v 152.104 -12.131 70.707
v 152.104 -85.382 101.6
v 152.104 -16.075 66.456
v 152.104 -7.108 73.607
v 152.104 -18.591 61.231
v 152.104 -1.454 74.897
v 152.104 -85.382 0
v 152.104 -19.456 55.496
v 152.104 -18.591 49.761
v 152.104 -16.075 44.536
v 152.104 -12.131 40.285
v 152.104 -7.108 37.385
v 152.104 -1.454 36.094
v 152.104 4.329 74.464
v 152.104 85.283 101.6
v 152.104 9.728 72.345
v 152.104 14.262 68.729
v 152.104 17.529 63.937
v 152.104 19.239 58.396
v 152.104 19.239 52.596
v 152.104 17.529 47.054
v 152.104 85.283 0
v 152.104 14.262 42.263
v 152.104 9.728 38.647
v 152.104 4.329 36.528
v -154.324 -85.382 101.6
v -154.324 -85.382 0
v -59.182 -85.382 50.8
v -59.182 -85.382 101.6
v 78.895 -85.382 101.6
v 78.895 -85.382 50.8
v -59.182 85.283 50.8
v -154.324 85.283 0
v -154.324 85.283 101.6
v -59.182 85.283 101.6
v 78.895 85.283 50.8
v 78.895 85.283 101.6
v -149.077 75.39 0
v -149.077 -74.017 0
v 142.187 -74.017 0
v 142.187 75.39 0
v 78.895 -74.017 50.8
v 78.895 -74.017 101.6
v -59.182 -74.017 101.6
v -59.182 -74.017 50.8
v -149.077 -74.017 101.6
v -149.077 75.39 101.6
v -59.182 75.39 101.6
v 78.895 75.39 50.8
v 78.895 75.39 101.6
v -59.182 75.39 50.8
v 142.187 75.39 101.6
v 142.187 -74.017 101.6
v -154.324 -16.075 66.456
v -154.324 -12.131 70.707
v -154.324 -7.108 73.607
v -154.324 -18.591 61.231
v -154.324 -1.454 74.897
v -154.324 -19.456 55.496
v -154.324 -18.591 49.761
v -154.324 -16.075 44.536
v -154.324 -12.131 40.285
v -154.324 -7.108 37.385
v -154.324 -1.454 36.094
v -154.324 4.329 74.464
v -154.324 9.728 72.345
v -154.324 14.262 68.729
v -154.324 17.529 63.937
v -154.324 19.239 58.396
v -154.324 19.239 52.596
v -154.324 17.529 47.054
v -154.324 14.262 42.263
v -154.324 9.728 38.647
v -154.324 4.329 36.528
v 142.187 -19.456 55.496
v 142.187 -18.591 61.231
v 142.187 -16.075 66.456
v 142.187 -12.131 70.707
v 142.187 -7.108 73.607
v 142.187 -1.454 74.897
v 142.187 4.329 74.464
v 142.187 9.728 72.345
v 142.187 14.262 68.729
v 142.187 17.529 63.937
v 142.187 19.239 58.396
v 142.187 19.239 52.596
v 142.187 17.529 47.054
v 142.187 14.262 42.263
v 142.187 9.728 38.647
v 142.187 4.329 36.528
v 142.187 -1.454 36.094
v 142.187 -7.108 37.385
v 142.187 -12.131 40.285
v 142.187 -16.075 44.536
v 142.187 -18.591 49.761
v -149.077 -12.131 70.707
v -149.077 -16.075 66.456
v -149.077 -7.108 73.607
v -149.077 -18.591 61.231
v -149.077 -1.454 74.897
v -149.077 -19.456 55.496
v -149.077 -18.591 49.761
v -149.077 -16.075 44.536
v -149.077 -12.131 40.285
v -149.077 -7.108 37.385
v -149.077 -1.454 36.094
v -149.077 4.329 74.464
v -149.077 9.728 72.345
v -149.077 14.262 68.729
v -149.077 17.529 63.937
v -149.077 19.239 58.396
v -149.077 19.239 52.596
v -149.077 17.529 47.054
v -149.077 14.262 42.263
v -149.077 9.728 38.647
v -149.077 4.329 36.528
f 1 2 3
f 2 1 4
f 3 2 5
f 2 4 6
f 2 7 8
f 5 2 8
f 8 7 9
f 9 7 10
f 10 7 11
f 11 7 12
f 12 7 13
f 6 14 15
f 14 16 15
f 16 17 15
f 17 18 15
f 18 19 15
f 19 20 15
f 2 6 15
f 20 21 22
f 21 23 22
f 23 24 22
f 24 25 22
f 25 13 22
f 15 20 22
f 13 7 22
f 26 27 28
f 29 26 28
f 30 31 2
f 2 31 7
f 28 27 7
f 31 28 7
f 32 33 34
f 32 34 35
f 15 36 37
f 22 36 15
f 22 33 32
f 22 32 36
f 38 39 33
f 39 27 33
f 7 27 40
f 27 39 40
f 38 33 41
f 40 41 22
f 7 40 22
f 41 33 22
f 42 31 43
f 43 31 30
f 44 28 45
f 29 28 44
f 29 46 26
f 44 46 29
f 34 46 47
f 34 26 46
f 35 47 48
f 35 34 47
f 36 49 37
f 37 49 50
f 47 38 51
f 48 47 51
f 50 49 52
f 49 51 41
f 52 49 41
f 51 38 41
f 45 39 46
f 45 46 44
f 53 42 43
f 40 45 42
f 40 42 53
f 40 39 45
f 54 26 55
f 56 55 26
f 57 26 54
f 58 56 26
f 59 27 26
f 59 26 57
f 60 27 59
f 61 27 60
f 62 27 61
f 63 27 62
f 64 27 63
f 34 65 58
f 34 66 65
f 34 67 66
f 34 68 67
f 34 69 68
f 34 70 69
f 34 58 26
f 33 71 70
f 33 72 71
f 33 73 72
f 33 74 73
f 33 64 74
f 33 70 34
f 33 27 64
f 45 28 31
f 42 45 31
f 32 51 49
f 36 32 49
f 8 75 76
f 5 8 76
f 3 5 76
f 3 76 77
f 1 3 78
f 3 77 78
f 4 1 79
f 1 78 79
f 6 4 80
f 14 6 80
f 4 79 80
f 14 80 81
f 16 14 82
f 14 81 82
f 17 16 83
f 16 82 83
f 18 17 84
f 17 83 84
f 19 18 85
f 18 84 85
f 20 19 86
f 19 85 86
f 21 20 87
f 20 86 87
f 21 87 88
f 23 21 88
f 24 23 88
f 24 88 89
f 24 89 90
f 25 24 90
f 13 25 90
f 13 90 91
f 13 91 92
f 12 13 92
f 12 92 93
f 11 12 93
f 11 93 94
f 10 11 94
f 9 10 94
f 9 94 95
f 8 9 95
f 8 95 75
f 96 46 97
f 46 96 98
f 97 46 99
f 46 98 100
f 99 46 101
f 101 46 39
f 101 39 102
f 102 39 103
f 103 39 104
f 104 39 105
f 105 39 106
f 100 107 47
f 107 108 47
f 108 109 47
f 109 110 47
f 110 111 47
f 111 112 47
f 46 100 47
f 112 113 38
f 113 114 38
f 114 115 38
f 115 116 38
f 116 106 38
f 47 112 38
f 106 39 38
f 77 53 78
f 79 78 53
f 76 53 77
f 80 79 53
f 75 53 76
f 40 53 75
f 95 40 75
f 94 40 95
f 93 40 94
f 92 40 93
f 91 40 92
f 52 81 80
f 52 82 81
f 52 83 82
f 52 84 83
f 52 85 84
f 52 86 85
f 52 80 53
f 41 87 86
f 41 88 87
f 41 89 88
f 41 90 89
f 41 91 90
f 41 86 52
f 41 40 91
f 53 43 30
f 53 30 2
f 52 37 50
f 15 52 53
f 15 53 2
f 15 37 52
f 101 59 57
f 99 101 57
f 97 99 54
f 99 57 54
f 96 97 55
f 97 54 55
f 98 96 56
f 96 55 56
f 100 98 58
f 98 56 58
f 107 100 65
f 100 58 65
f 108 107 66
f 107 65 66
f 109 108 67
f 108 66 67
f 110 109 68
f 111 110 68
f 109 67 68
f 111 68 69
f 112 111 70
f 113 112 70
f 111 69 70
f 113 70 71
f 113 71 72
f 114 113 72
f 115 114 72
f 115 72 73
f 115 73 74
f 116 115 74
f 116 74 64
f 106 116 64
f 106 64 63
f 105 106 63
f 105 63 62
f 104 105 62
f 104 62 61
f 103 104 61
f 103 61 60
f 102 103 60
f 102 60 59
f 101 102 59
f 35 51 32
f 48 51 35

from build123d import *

# Parameters (mm, degrees)
F0_W     = 306.4280003309
F0_H     = 170.664742589
F0_W_2   = 291.2639975548
F0_H_2   = 149.4066938758
F1_DEPTH = 101.6
F2_W     = 138.0773968995
F2_H     = 67.8825782061
F3_DEPTH = 25.4
F4_DEPTH = 219.202
F5_R     = 19.4558294746
F6_DEPTH = 25.4
F7_DEPTH = 393.7


with BuildPart() as f1:
    # F0 (on Top) → F1 (new body)
    with BuildSketch(Plane.XY):
        with Locations((-1.1102333665, -0.0495761633)):
            Rectangle(F0_W, F0_H)
        with Locations((-3.4452080727, 0.6861723959)):
            Rectangle(F0_W_2, F0_H_2, mode=Mode.SUBTRACT)
    extrude(amount=F1_DEPTH)

    # F2 (on face) → F3 (join)
    with BuildSketch(Plane.XZ.offset(85.3819474578)):
        with Locations((9.856319055, 84.741289103)):
            Rectangle(F2_W, F2_H)
    extrude(amount=F3_DEPTH)

    # F4 (cut): a face of the model
    f4_faces = [f1.faces().sort_by_distance(p)[0] for p in [
        (9.856319055, -110.7819474578, 84.741289103),
    ]]
    extrude(f4_faces, amount=-F4_DEPTH, mode=Mode.SUBTRACT)

    # F5 (on face) → F6 (join)
    with BuildSketch(Plane(origin=(-154.324233532, 0, 0), x_dir=(0, -1, 0), z_dir=(-1, 0, 0))):
        with Locations((0, 55.4958842695)):
            Circle(F5_R)
    extrude(amount=F6_DEPTH)

    # F7 (cut): a face of the model
    f7_faces = [f1.faces().sort_by_distance(p)[0] for p in [
        (-179.724233532, 0, 55.4958842695),
    ]]
    extrude(f7_faces, amount=-F7_DEPTH, mode=Mode.SUBTRACT)


solid = f1.part
